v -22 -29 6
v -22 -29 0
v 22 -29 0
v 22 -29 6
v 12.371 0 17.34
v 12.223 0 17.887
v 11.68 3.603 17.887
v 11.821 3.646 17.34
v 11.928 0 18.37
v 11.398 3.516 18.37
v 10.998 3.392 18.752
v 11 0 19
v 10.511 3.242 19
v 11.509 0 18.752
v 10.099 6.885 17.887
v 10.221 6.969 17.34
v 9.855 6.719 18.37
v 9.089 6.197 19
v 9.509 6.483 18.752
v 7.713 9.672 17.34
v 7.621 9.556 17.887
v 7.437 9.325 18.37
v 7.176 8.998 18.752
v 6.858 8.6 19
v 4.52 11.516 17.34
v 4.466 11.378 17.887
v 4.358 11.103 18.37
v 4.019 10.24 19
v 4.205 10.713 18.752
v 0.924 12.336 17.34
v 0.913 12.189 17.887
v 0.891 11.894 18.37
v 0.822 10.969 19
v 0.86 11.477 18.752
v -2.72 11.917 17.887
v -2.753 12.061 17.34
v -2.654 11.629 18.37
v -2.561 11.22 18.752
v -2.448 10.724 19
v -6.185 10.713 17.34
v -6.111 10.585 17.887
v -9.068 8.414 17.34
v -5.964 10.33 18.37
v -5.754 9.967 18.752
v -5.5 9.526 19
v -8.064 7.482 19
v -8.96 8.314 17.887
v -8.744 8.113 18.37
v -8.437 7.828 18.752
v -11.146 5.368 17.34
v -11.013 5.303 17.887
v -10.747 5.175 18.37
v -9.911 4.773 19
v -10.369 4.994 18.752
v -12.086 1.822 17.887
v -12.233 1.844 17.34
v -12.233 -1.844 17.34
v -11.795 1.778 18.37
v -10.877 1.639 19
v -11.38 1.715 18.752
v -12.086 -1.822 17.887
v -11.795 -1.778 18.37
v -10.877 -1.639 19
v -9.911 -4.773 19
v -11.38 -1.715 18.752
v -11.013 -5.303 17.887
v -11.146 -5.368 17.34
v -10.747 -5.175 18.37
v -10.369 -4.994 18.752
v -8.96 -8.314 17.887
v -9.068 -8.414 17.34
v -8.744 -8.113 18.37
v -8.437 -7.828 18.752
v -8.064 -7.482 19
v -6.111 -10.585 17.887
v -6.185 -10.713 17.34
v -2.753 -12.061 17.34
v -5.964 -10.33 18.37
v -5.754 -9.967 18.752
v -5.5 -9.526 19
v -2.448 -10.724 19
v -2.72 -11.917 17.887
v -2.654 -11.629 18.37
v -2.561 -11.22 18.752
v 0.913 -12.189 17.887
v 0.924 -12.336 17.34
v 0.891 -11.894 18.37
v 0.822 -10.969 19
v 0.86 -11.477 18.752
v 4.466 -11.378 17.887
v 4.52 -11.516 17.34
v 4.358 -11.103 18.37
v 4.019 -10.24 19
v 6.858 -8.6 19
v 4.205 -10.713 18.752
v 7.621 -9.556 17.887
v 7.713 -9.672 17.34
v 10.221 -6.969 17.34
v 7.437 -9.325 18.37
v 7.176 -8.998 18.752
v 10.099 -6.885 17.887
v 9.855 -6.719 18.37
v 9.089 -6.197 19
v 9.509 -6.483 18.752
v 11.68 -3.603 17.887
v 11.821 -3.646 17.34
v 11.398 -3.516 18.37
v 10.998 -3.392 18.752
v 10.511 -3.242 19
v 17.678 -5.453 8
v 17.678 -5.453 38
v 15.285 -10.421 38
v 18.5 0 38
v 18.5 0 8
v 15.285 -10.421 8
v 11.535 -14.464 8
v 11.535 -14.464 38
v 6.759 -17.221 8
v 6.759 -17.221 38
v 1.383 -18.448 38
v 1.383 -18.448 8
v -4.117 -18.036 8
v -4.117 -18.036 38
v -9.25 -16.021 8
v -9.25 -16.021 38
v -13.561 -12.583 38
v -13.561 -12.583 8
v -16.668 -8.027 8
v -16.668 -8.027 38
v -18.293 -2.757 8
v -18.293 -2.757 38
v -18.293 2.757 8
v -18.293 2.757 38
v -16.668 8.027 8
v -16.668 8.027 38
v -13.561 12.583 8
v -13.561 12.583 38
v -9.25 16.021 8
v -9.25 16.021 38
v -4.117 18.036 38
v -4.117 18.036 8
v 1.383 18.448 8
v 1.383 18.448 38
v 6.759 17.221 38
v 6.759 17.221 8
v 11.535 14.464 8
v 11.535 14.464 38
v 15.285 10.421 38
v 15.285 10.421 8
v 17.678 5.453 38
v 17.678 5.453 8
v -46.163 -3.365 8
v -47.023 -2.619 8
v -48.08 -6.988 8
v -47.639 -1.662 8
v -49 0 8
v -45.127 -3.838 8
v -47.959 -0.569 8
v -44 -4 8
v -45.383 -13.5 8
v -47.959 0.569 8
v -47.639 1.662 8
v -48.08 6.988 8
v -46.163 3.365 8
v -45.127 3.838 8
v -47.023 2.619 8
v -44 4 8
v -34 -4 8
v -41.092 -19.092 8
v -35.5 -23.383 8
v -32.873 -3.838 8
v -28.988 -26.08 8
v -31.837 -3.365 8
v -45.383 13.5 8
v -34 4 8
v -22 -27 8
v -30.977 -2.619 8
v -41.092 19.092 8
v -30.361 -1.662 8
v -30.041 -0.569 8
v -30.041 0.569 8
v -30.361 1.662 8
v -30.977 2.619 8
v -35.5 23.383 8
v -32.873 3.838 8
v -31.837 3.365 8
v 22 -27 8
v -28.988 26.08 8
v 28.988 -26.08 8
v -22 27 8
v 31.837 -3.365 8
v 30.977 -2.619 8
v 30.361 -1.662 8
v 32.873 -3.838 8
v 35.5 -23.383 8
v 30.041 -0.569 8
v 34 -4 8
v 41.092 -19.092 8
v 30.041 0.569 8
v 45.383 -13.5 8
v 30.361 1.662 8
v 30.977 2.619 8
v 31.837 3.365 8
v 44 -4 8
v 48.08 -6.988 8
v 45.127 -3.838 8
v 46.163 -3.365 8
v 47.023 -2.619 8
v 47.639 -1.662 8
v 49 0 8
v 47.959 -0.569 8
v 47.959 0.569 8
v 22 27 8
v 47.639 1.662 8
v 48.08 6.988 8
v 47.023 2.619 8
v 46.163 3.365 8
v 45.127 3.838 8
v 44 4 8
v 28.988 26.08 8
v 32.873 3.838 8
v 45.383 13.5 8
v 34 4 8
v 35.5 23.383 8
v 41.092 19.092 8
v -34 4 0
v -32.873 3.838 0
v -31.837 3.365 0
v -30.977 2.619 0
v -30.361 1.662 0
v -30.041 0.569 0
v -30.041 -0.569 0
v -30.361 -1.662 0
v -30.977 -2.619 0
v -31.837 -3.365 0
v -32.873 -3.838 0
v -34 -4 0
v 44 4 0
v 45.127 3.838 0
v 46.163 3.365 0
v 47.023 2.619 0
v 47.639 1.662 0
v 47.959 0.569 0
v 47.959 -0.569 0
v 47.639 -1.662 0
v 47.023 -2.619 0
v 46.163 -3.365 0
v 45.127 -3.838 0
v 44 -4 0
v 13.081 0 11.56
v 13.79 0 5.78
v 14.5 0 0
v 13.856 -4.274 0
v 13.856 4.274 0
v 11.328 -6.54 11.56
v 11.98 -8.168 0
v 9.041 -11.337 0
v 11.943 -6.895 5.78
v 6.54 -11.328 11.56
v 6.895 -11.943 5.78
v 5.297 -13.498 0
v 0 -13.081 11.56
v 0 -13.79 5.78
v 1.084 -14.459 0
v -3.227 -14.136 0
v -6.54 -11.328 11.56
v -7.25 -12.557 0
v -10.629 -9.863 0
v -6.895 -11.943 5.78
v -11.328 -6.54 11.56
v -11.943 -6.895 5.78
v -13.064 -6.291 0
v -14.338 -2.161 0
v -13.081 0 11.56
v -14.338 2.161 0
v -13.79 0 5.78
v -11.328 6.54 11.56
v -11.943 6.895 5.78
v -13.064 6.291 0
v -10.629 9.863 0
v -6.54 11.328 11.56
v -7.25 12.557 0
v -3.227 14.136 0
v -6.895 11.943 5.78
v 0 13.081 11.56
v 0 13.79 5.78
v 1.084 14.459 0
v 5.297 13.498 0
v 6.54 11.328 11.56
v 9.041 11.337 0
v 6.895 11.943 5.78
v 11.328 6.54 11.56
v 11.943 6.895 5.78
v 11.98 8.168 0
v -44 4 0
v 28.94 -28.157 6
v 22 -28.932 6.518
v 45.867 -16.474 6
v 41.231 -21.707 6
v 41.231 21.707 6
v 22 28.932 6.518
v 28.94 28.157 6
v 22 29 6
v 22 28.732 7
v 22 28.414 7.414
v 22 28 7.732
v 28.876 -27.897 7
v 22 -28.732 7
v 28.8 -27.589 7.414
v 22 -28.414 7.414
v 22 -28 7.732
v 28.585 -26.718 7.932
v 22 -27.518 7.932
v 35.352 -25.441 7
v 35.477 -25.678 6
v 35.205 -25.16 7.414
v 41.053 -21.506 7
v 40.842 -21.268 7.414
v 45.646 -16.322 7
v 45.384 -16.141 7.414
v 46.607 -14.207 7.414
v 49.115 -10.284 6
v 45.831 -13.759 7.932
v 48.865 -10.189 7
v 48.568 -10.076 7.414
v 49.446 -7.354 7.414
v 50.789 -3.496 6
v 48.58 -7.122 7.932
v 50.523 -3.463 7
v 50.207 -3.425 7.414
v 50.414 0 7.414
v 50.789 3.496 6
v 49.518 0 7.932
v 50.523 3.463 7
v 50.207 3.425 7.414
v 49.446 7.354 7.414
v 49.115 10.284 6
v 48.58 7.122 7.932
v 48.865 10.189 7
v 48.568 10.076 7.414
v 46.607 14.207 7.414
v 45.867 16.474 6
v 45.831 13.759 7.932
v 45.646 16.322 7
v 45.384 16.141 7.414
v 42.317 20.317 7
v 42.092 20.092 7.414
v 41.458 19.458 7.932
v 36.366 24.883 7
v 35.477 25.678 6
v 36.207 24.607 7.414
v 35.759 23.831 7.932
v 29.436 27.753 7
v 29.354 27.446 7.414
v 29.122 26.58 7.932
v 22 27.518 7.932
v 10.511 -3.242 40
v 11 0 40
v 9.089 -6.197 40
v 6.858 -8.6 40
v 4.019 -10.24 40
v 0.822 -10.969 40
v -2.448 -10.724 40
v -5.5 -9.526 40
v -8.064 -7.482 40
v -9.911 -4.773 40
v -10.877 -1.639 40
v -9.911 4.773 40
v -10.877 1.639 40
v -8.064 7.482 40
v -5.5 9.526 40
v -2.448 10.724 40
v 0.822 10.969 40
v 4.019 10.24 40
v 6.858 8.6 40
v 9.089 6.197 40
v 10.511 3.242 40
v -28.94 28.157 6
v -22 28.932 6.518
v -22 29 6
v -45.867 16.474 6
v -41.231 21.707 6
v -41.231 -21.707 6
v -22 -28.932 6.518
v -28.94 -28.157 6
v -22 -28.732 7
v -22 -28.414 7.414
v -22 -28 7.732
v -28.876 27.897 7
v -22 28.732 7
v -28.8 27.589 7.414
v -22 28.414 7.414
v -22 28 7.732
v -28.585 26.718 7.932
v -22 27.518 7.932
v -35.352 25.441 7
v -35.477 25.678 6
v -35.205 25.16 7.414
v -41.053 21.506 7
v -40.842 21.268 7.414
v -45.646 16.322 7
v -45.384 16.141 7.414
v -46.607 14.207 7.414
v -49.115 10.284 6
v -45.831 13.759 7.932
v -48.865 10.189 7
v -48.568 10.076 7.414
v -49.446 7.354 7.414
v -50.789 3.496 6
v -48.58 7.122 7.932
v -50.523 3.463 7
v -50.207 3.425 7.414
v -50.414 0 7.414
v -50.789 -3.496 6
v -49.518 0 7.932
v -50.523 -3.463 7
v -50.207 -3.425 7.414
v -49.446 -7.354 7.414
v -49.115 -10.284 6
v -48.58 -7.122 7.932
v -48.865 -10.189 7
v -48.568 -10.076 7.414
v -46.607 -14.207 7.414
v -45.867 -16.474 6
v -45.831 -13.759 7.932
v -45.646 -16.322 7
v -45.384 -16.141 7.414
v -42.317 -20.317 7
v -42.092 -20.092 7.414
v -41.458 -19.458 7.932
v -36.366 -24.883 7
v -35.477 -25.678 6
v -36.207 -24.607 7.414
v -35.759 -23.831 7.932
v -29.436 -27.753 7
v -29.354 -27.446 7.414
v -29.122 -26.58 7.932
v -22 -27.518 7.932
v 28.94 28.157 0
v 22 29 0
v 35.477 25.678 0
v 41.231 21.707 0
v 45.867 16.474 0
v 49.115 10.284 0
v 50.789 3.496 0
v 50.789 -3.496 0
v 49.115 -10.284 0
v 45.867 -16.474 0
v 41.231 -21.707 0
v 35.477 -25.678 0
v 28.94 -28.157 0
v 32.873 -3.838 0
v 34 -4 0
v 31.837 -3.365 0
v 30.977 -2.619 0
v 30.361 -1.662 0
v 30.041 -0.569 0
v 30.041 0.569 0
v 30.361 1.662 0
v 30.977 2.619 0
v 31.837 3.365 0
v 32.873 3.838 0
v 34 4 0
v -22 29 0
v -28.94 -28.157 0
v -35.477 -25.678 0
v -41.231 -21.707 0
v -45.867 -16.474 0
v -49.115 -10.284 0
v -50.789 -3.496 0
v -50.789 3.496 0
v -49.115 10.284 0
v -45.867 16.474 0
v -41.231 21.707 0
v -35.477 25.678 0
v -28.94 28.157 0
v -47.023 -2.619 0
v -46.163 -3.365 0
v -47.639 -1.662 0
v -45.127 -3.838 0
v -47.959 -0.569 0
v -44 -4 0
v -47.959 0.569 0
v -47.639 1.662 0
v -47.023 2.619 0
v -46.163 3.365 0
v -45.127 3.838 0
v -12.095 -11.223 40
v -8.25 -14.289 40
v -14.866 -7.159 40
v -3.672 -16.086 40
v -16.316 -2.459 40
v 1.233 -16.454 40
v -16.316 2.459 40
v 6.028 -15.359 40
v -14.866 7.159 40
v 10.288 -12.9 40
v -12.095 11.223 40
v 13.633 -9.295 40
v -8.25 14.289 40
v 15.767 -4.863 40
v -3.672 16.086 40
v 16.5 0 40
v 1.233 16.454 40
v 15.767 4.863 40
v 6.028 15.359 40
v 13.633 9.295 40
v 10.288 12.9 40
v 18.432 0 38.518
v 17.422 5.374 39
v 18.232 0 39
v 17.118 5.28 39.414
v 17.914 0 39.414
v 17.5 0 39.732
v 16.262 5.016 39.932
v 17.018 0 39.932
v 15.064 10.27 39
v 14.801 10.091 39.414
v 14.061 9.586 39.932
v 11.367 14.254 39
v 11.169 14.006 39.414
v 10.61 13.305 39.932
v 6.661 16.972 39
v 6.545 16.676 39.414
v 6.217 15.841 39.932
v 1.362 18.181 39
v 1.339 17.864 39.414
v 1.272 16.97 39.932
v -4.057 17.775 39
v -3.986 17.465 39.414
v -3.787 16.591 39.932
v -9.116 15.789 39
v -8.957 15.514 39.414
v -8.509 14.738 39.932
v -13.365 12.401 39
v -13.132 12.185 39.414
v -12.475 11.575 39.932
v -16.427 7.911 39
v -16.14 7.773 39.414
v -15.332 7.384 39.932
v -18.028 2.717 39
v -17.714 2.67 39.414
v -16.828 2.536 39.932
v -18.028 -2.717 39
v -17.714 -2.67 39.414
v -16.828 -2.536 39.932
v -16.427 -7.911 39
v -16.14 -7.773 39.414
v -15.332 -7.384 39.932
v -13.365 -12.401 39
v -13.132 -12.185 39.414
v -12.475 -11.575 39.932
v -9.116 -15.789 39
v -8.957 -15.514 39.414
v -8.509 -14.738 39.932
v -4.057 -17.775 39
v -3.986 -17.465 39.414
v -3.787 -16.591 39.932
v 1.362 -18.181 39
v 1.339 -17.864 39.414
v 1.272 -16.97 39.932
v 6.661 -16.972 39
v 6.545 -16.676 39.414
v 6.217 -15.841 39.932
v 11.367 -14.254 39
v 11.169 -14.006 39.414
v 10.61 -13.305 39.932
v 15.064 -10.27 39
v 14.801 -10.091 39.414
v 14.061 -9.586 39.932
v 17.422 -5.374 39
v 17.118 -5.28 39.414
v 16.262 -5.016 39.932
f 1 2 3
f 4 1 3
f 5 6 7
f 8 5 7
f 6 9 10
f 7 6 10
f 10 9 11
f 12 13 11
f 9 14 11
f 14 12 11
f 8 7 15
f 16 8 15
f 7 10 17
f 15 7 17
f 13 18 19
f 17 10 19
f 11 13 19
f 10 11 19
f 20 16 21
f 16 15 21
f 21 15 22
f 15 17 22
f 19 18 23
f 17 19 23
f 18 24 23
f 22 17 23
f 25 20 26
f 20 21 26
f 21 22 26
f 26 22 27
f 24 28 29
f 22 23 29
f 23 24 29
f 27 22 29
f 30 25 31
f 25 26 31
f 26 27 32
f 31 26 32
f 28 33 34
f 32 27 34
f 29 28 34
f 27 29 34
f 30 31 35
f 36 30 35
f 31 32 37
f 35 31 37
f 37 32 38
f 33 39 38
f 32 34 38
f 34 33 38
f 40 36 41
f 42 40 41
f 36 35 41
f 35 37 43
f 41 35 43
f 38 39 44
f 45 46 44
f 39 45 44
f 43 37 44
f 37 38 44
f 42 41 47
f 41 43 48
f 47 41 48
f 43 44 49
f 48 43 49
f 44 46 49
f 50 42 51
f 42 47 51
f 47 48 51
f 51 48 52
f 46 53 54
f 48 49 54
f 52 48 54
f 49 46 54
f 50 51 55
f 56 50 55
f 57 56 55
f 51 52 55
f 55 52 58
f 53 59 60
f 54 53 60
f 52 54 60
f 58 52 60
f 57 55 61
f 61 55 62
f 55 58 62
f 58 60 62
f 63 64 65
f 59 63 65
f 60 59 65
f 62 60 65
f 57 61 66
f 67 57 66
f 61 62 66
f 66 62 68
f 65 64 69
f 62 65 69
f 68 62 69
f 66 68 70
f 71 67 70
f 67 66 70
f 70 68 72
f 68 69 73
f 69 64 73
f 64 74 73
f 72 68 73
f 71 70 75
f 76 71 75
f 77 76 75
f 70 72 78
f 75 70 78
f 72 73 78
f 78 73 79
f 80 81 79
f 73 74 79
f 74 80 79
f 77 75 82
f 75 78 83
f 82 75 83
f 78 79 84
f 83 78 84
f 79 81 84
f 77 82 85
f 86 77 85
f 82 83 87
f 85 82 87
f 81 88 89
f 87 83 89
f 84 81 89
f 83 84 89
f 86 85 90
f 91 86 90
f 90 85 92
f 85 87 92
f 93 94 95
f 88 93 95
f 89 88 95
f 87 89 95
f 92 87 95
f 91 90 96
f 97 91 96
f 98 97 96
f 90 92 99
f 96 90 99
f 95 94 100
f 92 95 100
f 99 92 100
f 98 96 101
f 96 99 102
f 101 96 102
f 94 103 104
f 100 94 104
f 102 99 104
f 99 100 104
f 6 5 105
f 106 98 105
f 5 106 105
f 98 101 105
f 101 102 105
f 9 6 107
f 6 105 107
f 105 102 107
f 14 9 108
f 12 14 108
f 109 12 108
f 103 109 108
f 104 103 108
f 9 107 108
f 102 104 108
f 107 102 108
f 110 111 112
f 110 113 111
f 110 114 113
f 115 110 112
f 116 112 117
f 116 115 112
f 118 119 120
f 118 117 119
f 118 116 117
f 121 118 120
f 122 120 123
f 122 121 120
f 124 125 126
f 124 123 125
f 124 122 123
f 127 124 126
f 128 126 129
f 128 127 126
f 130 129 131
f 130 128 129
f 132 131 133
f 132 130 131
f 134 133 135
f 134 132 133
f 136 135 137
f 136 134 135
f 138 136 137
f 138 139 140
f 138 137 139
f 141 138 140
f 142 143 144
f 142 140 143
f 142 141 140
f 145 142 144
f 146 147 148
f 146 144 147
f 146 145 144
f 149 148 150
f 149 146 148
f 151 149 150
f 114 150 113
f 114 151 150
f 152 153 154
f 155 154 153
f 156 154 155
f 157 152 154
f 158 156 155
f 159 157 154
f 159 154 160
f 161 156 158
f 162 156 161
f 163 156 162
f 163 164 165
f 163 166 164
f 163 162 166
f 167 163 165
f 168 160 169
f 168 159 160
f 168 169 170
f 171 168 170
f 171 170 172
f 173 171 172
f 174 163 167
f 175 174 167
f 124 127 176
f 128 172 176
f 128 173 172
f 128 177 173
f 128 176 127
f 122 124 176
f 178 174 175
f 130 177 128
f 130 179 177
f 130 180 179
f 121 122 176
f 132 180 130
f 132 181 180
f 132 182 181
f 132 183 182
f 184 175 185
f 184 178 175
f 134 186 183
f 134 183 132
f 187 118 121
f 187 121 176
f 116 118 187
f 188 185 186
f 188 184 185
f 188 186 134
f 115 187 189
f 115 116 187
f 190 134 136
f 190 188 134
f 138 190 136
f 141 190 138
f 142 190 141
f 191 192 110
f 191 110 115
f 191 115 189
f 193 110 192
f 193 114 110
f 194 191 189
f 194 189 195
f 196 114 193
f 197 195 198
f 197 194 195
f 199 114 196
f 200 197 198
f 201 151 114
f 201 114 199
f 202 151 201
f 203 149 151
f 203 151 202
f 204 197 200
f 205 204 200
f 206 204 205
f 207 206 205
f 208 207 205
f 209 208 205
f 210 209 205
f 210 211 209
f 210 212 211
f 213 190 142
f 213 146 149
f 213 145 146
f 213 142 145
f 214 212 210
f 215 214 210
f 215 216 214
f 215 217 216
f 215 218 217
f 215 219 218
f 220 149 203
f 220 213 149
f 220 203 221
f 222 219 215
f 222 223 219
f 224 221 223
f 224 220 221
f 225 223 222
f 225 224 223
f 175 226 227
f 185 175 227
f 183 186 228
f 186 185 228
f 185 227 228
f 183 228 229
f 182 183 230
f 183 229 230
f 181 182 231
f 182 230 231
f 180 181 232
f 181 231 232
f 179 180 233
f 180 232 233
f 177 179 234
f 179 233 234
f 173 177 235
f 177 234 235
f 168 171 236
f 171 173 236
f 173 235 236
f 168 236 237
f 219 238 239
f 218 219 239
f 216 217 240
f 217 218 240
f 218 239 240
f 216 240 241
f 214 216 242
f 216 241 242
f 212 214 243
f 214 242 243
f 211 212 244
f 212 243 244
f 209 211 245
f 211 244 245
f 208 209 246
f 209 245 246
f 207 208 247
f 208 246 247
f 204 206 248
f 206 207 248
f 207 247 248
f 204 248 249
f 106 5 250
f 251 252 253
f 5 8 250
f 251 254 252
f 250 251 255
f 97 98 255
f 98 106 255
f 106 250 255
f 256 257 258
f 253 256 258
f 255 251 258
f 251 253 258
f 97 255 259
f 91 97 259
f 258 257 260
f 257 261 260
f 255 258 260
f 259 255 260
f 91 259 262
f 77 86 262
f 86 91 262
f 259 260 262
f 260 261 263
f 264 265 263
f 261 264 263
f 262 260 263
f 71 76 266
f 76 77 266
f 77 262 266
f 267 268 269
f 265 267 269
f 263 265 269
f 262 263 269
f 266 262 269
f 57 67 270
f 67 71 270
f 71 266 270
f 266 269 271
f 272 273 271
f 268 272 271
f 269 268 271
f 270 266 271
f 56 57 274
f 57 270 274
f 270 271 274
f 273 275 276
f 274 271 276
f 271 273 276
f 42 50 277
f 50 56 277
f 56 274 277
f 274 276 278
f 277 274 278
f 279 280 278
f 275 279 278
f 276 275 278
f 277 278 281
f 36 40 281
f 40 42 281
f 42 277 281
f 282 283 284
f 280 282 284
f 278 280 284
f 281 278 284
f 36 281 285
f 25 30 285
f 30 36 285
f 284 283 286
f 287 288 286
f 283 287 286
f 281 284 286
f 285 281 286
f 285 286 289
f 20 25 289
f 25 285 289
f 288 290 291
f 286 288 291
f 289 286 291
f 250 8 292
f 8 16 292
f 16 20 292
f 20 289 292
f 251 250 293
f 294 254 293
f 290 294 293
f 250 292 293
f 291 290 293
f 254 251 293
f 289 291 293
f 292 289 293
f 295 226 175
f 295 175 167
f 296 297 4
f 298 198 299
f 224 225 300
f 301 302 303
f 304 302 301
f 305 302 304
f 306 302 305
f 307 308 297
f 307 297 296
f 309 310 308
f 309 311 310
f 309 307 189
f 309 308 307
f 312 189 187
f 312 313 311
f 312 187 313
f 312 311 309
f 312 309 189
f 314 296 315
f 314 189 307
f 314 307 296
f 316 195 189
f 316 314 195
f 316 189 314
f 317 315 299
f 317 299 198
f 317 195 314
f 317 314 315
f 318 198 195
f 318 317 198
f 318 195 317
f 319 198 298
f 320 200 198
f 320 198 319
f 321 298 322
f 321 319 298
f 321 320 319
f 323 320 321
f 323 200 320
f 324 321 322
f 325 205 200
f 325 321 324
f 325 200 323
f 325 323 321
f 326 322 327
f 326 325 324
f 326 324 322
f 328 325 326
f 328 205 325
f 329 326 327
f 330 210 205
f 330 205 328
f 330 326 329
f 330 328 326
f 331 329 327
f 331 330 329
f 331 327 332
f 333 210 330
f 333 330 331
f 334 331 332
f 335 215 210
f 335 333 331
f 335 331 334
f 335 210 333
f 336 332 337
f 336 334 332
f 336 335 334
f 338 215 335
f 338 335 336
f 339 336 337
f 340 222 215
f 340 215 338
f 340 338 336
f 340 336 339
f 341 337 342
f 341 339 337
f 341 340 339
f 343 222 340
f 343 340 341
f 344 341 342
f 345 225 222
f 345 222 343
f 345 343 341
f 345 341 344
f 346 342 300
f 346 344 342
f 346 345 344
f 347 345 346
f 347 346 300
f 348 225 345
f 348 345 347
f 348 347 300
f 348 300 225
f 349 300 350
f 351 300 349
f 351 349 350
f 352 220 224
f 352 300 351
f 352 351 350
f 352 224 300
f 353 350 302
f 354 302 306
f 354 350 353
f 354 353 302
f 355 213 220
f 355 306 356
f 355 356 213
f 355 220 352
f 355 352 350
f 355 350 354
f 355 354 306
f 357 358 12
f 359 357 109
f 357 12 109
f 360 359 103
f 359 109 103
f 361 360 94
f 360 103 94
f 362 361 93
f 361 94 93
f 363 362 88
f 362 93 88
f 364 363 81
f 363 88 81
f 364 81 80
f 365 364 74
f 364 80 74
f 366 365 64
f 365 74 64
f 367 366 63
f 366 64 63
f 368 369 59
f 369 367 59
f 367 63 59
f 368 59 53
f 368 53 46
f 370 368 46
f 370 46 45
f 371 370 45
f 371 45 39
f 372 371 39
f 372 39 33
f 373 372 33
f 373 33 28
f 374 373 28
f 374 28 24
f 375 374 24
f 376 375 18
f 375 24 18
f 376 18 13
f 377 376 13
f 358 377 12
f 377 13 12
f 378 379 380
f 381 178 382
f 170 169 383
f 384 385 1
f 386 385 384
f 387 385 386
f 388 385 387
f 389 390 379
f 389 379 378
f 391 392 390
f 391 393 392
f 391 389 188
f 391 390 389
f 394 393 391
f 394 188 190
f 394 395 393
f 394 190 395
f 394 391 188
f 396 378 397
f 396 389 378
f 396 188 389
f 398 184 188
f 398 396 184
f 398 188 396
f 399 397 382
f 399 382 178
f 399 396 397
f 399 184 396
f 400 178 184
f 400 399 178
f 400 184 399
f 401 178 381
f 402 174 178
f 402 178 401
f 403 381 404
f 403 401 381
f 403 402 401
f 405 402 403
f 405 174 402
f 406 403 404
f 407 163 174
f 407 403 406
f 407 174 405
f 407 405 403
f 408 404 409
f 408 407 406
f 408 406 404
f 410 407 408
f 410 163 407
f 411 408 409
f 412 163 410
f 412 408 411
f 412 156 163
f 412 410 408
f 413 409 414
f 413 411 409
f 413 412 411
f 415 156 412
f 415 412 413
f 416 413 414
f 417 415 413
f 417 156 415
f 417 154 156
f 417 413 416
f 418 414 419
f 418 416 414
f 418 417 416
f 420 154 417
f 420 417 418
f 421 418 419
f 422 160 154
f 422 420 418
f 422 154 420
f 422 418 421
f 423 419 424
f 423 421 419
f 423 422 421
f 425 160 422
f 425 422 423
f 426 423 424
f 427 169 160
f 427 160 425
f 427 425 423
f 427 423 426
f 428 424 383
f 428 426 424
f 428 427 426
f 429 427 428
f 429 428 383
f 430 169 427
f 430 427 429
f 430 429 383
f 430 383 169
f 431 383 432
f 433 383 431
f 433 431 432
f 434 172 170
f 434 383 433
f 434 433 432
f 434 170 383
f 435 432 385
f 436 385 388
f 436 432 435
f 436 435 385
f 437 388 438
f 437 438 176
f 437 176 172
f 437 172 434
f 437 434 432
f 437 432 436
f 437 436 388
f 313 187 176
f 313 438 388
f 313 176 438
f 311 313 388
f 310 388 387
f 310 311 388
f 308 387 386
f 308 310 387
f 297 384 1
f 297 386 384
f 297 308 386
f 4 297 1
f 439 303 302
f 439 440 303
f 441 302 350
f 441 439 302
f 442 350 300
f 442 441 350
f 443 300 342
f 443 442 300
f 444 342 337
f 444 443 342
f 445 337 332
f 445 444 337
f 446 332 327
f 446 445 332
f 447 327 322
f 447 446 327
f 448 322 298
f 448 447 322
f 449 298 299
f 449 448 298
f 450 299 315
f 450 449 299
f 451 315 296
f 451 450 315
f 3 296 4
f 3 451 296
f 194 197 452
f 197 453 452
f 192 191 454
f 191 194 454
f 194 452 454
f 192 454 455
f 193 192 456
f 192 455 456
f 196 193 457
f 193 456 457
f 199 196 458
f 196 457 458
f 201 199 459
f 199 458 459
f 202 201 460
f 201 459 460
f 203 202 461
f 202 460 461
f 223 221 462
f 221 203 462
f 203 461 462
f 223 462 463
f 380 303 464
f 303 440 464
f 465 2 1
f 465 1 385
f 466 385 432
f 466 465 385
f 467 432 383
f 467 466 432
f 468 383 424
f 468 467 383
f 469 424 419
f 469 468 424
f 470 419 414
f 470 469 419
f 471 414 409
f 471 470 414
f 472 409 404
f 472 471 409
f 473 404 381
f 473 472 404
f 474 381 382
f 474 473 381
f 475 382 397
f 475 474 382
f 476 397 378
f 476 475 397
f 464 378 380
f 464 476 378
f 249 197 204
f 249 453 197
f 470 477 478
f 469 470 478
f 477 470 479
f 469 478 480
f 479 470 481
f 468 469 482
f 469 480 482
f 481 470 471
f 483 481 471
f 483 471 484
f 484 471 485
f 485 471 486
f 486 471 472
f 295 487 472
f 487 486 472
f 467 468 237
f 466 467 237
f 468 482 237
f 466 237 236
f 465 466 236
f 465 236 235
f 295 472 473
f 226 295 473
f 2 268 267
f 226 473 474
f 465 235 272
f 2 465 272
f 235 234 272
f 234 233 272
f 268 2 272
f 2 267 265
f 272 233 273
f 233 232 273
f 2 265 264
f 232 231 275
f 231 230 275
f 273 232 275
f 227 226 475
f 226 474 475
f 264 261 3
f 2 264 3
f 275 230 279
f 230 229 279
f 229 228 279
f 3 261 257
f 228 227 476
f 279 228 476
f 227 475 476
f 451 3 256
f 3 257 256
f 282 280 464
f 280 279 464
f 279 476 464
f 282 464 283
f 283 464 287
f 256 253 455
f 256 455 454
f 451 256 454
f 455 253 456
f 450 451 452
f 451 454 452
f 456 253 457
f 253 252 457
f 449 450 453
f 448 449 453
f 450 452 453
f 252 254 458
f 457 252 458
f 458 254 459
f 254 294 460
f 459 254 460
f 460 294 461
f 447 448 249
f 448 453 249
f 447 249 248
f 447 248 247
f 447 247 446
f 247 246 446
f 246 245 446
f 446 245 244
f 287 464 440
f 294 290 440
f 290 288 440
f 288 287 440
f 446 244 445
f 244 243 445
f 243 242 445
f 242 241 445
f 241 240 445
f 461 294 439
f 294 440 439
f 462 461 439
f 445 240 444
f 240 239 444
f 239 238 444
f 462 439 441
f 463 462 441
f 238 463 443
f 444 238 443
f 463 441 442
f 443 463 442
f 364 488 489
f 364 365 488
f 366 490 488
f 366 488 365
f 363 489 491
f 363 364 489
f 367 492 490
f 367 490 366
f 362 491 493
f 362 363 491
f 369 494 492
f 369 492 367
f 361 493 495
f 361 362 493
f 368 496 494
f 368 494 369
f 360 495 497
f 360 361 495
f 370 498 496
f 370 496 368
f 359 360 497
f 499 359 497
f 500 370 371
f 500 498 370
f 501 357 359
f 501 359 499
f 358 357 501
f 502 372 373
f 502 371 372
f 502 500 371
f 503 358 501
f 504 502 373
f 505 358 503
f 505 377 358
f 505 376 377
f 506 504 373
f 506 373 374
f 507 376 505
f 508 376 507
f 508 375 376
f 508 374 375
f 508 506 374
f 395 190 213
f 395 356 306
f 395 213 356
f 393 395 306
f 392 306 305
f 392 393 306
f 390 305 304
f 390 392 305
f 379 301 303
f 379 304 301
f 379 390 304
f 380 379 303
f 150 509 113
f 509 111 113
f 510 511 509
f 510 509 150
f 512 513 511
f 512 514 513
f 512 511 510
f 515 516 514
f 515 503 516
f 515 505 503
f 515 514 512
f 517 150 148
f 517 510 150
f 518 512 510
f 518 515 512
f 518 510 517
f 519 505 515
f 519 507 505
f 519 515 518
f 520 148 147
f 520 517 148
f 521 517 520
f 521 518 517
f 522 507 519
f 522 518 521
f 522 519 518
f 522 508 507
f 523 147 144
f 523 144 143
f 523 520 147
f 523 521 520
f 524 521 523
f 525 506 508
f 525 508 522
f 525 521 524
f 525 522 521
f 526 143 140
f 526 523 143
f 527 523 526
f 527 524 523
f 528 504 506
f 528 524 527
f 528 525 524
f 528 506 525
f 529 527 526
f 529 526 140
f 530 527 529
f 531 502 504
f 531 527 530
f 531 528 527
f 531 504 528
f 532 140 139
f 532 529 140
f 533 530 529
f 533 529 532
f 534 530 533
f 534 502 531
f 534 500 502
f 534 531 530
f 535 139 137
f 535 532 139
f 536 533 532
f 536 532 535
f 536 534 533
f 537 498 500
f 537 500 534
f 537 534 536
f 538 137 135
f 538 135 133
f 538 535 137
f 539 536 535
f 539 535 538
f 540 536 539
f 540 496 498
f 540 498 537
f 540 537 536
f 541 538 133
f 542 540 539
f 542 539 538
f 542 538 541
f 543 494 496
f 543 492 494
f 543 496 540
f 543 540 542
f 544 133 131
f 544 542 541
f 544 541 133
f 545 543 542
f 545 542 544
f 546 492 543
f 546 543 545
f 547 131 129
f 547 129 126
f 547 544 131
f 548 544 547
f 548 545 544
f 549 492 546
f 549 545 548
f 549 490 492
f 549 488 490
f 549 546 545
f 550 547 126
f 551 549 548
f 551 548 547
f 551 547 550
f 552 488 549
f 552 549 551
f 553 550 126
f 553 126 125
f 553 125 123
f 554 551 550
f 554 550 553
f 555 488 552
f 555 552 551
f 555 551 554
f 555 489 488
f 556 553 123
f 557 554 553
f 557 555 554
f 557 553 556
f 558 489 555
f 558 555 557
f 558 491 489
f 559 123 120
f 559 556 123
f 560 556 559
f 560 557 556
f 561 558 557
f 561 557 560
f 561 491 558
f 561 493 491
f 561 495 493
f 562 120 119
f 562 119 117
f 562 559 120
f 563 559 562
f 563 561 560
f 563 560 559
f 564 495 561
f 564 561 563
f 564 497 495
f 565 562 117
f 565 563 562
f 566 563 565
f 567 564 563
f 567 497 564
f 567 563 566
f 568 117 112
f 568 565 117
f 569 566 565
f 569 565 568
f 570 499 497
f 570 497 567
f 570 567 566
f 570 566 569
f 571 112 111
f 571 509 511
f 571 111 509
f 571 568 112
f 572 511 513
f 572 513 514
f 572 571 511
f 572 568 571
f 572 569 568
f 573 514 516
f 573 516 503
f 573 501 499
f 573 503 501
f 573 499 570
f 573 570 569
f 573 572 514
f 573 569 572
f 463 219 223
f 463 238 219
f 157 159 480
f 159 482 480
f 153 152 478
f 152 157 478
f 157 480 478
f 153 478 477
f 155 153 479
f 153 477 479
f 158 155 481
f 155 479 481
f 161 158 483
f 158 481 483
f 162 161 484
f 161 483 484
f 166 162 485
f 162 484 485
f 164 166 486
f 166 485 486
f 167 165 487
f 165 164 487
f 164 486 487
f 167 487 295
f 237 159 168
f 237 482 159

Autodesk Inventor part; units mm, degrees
ref_plane "YZ Plane" through (0, 0, 0) normal (1, 0, 0) x (0, 1, 0)
ref_plane "XZ Plane" through (0, 0, 0) normal (0, 1, 0) x (-1, 0, 0)
sketch "스케치1" plane through (0, 0, 0) normal (0, 0, 1) x (1, 0, 0)
  line L0 (-22, 0) -> (22, 0) construction
  line L1 (-22, -29) -> (22, -29)
  line L2 (22, 29) -> (-22, 29)
  arc A0 (-22, 29) -> (-22, -29) centre (-22, 0) ccw
  arc A1 (22, -29) -> (22, 29) centre (22, 0) ccw
  line L3 (-44, 0) -> (-34, 0) construction
  line L4 (-44, -4) -> (-34, -4)
  line L5 (-34, 4) -> (-44, 4)
  arc A2 (-44, 4) -> (-44, -4) centre (-44, 0) ccw
  arc A3 (-34, -4) -> (-34, 4) centre (-34, 0) ccw
  line L6 (44, 0) -> (34, 0) construction
  line L7 (44, 4) -> (34, 4)
  line L8 (34, -4) -> (44, -4)
  arc A4 (44, -4) -> (44, 4) centre (44, 0) ccw
  arc A5 (34, 4) -> (34, -4) centre (34, 0) ccw
  circle A6 centre (0, 0) radius 18.5
  circle A7 centre (0, 0) radius 11
  point P0 (-39, 0)
  point P1 (39, 0)
  dimension "d0" = 29
  dimension "d1" = 102
  dimension "d2" = 10
  dimension "d3" = 8
  dimension "d4" = 10
  dimension "d5" = 8
  dimension "d6" = 68
  dimension "d7" = 34
  dimension "d8" = 37
  dimension "d9" = 22
extrude "돌출1" add sketch "스케치1" along normal blind 8 contours A0 L2 A1 L1
extrude "돌출2" add sketch "스케치1" along normal blind 40 contours A6
ref_plane "작업 평면1" through (-22, 0, 0) normal (0, 1, 0) x (1, 0, 0)
sketch "스케치2" plane through (-22, 0, 0) normal (0, 1, 0) x (1, 0, 0)
  line L0 (36.5, 0) -> (34.1671, -19)
  line L1 (34.1671, -19) -> (9.8329, -19)
  line L2 (33, -40) -> (33, 0) projected
  line L3 (9.8329, -19) -> (7.5, 0)
  line L4 (85.0441, 0) -> (-77.2032, 0)
  line L5 (22, 10.7301) -> (22, -88.2666)
  point P0 (22, 0)
  point P1 (22, 0)
  point P2 (22, 0)
  point P3 (22, -19)
  dimension "d14" = 14
  dimension "d16" = 29
  dimension "d17" = 19
  dimension "d18" = 19
  dimension "d19" = 0
  dimension "d20" = 0
  dimension "d21" = 14.5
revolve "회전1" cut sketch "스케치2" angle 360 about axis through (0, 0, -10.7301) along (0, 0, 1) contours L0 L1 L2 L4 | L2 L1 L5 L4
fillet "모깎기1" radius 2 1 edges at (-12.1671, 0, 19)
fillet "모깎기2" radius 2 5 edges at (-18.5, 0, 40) (0, -29, 8) (51, 0, 8) (0, 29, 8) (-51, 0, 8)
properties part number "부품1"
